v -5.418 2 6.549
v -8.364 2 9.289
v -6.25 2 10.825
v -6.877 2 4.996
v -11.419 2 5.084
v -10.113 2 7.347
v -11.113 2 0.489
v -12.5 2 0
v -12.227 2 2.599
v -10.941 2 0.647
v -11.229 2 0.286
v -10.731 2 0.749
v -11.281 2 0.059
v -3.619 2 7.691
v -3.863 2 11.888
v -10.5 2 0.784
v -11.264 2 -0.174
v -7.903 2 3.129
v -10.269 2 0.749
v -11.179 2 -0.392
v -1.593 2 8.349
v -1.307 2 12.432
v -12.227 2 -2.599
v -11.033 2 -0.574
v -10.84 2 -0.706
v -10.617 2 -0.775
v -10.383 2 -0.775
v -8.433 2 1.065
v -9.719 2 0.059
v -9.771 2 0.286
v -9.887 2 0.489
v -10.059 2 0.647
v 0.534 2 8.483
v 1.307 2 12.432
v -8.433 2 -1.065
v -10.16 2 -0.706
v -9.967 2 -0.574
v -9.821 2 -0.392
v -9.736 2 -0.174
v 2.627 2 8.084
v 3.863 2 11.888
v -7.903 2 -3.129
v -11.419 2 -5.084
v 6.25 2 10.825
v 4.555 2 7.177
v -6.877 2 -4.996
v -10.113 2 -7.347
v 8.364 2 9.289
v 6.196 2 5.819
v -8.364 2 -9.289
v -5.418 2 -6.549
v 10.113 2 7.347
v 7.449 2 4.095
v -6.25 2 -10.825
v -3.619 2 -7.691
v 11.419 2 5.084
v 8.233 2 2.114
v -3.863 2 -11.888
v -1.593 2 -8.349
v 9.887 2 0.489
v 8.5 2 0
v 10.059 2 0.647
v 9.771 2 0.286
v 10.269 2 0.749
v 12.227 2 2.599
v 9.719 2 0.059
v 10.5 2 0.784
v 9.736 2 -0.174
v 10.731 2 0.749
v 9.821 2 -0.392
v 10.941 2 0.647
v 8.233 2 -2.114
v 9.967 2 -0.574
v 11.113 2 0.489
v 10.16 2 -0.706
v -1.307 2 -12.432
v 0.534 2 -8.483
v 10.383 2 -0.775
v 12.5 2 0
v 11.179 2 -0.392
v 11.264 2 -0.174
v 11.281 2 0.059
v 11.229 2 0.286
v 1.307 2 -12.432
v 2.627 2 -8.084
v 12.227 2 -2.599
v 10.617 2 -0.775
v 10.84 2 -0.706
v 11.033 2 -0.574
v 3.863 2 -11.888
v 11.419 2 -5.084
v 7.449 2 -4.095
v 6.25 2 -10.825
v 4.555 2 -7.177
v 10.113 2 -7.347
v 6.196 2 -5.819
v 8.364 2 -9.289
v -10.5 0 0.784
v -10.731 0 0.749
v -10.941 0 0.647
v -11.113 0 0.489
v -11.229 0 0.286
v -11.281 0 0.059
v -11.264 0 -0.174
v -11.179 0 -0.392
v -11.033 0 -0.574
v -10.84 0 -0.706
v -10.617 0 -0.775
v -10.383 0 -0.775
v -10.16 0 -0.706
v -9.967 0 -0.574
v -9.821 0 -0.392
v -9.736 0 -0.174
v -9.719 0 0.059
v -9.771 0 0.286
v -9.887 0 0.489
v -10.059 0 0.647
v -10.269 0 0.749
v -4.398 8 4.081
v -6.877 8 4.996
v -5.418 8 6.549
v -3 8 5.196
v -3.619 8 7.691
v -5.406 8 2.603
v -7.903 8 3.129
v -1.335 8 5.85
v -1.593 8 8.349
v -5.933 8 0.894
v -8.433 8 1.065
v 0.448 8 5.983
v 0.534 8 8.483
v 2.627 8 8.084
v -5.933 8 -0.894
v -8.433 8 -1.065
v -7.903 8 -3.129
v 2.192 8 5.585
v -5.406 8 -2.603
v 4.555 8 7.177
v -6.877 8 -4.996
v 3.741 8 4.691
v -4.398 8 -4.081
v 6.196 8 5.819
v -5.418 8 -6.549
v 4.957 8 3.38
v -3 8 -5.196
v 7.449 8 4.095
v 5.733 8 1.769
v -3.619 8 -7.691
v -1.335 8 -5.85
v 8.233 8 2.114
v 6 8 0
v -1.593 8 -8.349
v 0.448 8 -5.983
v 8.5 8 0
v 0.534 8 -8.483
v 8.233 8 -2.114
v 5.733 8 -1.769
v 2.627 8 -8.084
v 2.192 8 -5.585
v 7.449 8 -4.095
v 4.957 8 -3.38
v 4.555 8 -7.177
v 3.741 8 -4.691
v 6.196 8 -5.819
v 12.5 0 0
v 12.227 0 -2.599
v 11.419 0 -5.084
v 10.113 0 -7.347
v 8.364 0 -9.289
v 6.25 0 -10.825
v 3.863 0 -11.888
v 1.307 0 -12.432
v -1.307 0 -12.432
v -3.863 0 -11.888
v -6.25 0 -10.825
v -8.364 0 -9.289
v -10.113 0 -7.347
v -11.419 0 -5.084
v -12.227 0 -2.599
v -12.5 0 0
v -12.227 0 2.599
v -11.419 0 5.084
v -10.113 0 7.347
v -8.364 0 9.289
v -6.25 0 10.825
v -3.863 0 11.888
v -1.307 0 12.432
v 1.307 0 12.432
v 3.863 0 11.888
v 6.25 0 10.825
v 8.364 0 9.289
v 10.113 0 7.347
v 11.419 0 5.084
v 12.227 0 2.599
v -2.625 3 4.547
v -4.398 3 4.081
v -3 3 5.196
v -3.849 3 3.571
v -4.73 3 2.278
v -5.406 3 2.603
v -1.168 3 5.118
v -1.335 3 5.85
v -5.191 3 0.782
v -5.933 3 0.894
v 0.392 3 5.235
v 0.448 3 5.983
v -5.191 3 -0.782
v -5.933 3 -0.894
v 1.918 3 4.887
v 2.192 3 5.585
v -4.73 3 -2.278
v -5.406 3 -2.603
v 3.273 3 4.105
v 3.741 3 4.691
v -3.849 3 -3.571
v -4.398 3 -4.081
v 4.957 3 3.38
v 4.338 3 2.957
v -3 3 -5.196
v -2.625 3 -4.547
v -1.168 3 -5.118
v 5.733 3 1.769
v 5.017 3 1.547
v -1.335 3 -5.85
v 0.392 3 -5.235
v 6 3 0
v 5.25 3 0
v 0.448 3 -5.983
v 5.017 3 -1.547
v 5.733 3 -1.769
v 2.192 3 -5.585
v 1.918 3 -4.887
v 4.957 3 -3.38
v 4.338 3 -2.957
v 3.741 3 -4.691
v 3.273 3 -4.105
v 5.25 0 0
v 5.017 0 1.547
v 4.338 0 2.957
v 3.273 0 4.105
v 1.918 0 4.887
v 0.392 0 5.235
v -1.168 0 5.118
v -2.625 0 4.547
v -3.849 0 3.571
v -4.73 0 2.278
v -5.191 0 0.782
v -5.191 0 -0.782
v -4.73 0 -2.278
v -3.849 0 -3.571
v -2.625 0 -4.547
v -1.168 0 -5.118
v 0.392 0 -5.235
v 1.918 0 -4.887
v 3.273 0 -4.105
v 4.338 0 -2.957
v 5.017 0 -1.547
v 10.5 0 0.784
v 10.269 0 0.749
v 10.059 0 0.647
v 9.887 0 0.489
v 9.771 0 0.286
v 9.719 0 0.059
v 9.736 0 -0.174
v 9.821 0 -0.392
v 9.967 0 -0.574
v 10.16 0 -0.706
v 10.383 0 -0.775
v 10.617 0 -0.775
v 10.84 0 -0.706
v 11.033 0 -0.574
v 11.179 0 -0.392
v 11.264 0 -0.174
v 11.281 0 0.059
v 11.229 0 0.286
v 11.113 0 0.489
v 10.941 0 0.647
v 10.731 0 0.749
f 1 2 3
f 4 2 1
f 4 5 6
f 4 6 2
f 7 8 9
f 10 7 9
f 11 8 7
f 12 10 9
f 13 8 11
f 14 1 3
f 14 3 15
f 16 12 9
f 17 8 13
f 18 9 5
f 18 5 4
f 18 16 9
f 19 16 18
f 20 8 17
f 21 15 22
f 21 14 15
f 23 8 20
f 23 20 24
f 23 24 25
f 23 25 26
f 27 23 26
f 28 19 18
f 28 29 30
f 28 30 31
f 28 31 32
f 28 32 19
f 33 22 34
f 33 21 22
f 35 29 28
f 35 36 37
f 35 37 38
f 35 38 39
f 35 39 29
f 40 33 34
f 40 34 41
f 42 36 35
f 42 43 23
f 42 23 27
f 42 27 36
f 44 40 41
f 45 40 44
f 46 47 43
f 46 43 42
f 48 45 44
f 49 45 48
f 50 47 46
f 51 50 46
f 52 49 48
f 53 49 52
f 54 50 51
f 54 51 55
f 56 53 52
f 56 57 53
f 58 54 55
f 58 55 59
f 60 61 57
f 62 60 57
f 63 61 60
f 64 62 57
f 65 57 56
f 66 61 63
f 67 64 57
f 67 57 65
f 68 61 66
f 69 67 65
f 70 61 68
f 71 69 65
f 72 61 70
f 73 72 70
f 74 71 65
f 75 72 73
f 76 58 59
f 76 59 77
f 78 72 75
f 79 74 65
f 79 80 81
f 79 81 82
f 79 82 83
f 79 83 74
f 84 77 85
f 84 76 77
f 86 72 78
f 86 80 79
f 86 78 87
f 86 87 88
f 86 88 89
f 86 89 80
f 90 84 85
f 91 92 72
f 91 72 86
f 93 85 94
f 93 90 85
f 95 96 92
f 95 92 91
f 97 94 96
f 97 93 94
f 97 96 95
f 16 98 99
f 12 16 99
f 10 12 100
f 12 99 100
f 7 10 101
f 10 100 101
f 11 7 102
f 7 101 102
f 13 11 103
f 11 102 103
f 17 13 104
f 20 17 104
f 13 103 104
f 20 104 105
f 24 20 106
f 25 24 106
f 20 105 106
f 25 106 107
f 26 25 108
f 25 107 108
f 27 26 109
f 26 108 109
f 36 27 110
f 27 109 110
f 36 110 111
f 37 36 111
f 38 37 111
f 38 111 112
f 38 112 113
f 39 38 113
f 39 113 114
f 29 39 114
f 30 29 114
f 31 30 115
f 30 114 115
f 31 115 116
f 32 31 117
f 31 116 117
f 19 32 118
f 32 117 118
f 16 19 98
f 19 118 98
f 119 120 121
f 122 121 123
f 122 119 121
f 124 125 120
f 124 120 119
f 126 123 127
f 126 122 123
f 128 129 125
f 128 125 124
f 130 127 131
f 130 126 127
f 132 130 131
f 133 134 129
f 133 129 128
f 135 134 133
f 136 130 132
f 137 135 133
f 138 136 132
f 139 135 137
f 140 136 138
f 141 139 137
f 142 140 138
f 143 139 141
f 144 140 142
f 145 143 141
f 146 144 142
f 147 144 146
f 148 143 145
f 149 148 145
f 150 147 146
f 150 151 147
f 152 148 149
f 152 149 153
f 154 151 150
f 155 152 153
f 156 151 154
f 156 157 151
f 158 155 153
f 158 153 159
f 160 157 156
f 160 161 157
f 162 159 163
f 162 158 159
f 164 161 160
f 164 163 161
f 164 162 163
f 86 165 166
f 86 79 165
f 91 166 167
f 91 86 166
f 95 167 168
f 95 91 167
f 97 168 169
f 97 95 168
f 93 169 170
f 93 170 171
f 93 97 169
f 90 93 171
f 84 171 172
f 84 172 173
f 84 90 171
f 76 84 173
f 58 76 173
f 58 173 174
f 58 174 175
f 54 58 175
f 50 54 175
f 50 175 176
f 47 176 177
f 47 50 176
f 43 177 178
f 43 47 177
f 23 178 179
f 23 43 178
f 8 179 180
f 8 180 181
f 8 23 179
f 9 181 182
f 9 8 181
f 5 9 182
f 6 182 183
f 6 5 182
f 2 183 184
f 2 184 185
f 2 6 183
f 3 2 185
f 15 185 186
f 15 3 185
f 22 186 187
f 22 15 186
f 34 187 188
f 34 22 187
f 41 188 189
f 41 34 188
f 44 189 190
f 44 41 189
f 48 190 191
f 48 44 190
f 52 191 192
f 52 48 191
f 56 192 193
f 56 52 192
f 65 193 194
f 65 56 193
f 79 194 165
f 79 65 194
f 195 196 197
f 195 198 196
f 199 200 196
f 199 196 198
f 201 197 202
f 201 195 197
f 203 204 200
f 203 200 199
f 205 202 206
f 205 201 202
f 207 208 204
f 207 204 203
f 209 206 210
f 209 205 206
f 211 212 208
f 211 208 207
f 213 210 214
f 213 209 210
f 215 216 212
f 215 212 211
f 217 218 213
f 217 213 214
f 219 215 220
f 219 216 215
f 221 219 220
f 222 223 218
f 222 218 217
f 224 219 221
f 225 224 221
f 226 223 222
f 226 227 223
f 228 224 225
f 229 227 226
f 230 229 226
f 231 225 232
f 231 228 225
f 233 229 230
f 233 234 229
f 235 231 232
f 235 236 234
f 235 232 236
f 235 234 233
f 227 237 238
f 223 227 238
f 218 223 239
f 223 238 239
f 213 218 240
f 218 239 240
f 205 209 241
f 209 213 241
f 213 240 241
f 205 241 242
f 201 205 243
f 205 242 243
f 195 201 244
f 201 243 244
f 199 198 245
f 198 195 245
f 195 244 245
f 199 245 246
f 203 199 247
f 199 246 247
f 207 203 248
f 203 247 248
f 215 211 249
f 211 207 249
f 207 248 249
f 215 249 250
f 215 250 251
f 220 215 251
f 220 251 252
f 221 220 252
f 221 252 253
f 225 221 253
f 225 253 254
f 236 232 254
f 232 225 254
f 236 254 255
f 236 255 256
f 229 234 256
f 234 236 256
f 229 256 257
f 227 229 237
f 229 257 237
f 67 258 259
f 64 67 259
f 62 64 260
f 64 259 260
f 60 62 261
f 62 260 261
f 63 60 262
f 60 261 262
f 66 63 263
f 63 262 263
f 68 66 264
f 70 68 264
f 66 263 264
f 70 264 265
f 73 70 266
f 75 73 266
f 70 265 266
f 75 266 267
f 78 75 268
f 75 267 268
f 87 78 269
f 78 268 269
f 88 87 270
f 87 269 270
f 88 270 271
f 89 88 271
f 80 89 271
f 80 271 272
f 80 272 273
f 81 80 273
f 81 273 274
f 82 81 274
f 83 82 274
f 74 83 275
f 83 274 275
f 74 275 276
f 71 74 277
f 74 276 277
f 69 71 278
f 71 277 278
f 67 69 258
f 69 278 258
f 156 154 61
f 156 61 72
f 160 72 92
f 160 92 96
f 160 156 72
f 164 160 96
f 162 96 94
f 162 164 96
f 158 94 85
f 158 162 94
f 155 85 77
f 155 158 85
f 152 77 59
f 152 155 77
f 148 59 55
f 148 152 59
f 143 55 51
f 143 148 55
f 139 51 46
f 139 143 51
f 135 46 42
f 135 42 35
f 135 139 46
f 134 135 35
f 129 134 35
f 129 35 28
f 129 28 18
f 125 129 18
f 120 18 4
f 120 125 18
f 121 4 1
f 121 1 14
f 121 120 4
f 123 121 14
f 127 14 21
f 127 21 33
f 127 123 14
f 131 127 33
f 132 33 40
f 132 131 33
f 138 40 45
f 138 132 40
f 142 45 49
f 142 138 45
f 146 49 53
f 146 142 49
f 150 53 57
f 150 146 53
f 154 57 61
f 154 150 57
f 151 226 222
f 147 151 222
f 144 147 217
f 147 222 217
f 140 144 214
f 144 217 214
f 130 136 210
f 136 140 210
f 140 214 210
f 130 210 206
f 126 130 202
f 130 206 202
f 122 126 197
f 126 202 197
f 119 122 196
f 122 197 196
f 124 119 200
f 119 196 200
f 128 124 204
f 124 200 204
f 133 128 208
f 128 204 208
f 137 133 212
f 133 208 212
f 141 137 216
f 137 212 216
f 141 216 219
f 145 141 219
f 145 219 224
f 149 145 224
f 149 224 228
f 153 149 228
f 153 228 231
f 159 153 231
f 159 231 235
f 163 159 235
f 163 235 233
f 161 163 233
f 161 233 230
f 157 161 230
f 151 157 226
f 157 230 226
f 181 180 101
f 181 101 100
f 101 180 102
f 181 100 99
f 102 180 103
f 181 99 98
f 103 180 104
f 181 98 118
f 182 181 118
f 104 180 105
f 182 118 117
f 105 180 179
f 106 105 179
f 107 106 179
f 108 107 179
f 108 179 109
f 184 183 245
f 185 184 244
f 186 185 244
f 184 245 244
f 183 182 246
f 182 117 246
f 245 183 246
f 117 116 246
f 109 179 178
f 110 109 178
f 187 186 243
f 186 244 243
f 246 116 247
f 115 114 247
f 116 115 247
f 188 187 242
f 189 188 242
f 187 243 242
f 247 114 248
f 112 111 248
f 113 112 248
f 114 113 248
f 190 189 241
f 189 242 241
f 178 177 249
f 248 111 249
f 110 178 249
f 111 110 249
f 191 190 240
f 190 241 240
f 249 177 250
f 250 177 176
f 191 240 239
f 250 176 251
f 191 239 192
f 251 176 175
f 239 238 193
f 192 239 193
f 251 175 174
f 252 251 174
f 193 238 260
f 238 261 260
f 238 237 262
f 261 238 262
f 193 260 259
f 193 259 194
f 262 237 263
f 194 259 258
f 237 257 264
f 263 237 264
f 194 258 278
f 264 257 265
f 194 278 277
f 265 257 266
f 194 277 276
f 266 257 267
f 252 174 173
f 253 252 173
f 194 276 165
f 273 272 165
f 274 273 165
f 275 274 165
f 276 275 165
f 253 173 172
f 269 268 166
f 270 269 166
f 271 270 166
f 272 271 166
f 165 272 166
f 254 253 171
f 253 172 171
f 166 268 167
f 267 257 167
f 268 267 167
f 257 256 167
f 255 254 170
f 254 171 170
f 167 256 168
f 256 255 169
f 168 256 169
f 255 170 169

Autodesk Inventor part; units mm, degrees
ref_plane "YZ Plane" through (0, 0, 0) normal (1, 0, 0) x (0, 1, 0)
ref_plane "XZ Plane" through (0, 0, 0) normal (0, 1, 0) x (-1, 0, 0)
ref_plane "XY Plane" through (0, 0, 0) normal (0, 0, 1) x (1, 0, 0)
sketch "Sketch1" plane through (0, 0, 0) normal (0, 0, 1) x (1, 0, 0)
  line L0 (0, 0) -> (0, 8) construction
  line L1 (6, 0) -> (12.5, 0)
  line L2 (12.5, 0) -> (12.5, 2)
  line L3 (12.5, 2) -> (8.5, 2)
  line L4 (8.5, 2) -> (8.5, 8)
  line L5 (8.5, 8) -> (6, 8)
  line L6 (6, 8) -> (6, 3)
  line L7 (6, 3) -> (5.25, 3)
  line L8 (5.25, 3) -> (5.25, 0)
  line L9 (5.25, 0) -> (6, 0)
  line L10 (6, 0) -> (6, 0)
  line L11 (10.5, 2) -> (10.5, 0) construction
  line L12 (9.5, 2) -> (11.5, 2) construction
  line L13 (11.5, 2) -> (11.5, 0) construction
  line L14 (11.5, 0) -> (9.5, 0) construction
  line L15 (9.5, 0) -> (9.5, 2) construction
  line L16 (9.5, 2) -> (11.5, 0) construction
  line L17 (11.5, 2) -> (9.5, 0) construction
  line L18 (-2.5, 0) -> (15, 0) construction
  point P0 (10.5, 1)
  dimension "d1" = 2
  dimension "d3" = 2
  dimension "d4" = 12
  dimension "d5" = 2.5
  dimension "JointFixation_FixHole_Dia" = 21
  dimension "ShaftFixation_UpperLower_Height" = 8
  dimension "Bearing_OuterRing_Dia" = 10.5
  dimension "JointFixation_DiaOut" = 25
  dimension "d28" = 5
revolve "Revolution1" add sketch "Sketch1" angle 360 about axis through (0, 0, 0) along (0, 1, 0)
sketch "Sketch2" plane through (0, 2, 0) normal (0, 1, 0) x (1, 0, 0)
  circle A0 centre (0, 0) radius 8.5 projected
  circle A1 centre (0, 0) radius 12.5 projected
  line L0 (-9.1652, 8.5) -> (9.1652, 8.5)
  line L1 (-9.1652, -8.5) -> (9.1652, -8.5)
  circle A2 centre (0, 0) radius 10.5 construction
  line L2 (0, 0) -> (-10.5, 0) construction
  point P0 (0, 0)
  point P1 (10.5, 0)
  dimension "d14" = 21
  dimension "d17" = 360
  dimension "LowerArm_BearingFixFlansch_Width" = 17
hole "Hole1" at (-10.5, 2, 0) at (10.5, 2, 0) direction (0, -1, 0) diameter 1.567 end through all thread size "M2x0.4" class "6H" standard "ISO Metric profile"
equation "\"d14\" = JointFixation_FixHole_Dia"
properties part number "LowerArm_JointFixation" material "Aluminum 6061"
